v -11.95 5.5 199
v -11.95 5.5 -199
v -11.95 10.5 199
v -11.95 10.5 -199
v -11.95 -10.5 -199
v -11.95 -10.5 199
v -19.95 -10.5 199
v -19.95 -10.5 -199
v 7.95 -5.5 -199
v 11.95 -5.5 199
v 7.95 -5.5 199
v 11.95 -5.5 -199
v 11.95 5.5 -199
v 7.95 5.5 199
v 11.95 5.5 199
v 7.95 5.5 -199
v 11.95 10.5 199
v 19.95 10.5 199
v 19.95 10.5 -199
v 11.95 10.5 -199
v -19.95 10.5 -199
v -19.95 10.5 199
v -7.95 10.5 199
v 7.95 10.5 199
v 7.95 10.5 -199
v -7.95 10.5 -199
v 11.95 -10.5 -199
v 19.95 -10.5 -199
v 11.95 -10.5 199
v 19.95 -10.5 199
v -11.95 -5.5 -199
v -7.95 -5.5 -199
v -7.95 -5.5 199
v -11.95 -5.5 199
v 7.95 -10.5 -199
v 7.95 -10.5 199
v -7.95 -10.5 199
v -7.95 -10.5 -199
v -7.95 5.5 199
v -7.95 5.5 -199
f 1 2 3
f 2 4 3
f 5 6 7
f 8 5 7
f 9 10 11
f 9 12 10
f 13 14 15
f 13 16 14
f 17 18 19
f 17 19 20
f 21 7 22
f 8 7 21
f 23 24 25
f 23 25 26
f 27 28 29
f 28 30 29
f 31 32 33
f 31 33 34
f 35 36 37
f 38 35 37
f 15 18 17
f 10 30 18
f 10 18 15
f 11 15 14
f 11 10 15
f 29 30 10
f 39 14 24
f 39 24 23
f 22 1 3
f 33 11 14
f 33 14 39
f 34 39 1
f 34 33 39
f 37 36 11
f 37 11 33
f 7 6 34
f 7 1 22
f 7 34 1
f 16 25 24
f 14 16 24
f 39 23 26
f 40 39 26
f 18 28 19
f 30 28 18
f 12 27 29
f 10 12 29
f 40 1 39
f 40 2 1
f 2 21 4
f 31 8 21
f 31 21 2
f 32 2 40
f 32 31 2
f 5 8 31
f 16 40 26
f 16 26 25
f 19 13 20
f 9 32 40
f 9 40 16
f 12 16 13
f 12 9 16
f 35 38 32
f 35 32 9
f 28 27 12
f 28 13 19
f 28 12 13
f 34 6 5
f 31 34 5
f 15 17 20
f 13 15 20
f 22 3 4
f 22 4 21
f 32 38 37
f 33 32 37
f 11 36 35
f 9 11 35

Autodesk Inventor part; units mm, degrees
ref_plane "YZ Plane" through (0, 0, 0) normal (1, 0, 0) x (0, 1, 0)
ref_plane "XZ Plane" through (0, 0, 0) normal (0, 1, 0) x (-1, 0, 0)
ref_plane "XY Plane" through (0, 0, 0) normal (0, 0, 1) x (1, 0, 0)
sketch "Sketch1" plane through (0, 0, 0) normal (0, 1, 0) x (-1, 0, 0)
  line L0 (-19.95, 199) -> (19.95, 199)
  line L1 (19.95, 199) -> (19.95, -199)
  line L2 (19.95, -199) -> (-19.95, -199)
  line L3 (-19.95, -199) -> (-19.95, 199)
  line L4 (-19.95, 199) -> (19.95, -199) construction
  line L5 (19.95, 199) -> (-19.95, -199) construction
  point P0 (0, 0)
  dimension "d0" = 39.9
  dimension "d1" = 398
extrude "Extrusion1" add sketch "Sketch1" along normal mid plane 21
sketch "Sketch2" plane through (0, 10.5, 0) normal (0, 1, 0) x (1, 0, 0)
  line L0 (-19.95, -199) -> (19.95, -199) projected
  line L1 (19.95, 199) -> (-19.95, 199) projected
  line L2 (-11.95, -199) -> (-7.95, -199)
  line L3 (-7.95, -199) -> (-7.95, 199)
  line L4 (-7.95, 199) -> (-11.95, 199)
  line L5 (-11.95, 199) -> (-11.95, -199)
  line L6 (0, -199) -> (0, 199) construction
  line L7 (-19.95, 199) -> (-19.95, -199) projected
  line L8 (7.95, -199) -> (11.95, -199)
  line L9 (11.95, -199) -> (11.95, 199)
  line L10 (11.95, 199) -> (7.95, 199)
  line L11 (7.95, 199) -> (7.95, -199)
  point P0 (0, 0)
  point P1 (-11.95, 199)
  dimension "d4" = 4
  dimension "d5" = 8
extrude "Extrusion2" cut sketch "Sketch2" against normal blind 5 contours L5 L1 L3 L0 | L11 L1 L9 L0
mirror "Mirror1" about plane through (0, 0, 0) normal (0, 1, 0) of "Extrusion2"
properties part number "Linear Rail Base"
